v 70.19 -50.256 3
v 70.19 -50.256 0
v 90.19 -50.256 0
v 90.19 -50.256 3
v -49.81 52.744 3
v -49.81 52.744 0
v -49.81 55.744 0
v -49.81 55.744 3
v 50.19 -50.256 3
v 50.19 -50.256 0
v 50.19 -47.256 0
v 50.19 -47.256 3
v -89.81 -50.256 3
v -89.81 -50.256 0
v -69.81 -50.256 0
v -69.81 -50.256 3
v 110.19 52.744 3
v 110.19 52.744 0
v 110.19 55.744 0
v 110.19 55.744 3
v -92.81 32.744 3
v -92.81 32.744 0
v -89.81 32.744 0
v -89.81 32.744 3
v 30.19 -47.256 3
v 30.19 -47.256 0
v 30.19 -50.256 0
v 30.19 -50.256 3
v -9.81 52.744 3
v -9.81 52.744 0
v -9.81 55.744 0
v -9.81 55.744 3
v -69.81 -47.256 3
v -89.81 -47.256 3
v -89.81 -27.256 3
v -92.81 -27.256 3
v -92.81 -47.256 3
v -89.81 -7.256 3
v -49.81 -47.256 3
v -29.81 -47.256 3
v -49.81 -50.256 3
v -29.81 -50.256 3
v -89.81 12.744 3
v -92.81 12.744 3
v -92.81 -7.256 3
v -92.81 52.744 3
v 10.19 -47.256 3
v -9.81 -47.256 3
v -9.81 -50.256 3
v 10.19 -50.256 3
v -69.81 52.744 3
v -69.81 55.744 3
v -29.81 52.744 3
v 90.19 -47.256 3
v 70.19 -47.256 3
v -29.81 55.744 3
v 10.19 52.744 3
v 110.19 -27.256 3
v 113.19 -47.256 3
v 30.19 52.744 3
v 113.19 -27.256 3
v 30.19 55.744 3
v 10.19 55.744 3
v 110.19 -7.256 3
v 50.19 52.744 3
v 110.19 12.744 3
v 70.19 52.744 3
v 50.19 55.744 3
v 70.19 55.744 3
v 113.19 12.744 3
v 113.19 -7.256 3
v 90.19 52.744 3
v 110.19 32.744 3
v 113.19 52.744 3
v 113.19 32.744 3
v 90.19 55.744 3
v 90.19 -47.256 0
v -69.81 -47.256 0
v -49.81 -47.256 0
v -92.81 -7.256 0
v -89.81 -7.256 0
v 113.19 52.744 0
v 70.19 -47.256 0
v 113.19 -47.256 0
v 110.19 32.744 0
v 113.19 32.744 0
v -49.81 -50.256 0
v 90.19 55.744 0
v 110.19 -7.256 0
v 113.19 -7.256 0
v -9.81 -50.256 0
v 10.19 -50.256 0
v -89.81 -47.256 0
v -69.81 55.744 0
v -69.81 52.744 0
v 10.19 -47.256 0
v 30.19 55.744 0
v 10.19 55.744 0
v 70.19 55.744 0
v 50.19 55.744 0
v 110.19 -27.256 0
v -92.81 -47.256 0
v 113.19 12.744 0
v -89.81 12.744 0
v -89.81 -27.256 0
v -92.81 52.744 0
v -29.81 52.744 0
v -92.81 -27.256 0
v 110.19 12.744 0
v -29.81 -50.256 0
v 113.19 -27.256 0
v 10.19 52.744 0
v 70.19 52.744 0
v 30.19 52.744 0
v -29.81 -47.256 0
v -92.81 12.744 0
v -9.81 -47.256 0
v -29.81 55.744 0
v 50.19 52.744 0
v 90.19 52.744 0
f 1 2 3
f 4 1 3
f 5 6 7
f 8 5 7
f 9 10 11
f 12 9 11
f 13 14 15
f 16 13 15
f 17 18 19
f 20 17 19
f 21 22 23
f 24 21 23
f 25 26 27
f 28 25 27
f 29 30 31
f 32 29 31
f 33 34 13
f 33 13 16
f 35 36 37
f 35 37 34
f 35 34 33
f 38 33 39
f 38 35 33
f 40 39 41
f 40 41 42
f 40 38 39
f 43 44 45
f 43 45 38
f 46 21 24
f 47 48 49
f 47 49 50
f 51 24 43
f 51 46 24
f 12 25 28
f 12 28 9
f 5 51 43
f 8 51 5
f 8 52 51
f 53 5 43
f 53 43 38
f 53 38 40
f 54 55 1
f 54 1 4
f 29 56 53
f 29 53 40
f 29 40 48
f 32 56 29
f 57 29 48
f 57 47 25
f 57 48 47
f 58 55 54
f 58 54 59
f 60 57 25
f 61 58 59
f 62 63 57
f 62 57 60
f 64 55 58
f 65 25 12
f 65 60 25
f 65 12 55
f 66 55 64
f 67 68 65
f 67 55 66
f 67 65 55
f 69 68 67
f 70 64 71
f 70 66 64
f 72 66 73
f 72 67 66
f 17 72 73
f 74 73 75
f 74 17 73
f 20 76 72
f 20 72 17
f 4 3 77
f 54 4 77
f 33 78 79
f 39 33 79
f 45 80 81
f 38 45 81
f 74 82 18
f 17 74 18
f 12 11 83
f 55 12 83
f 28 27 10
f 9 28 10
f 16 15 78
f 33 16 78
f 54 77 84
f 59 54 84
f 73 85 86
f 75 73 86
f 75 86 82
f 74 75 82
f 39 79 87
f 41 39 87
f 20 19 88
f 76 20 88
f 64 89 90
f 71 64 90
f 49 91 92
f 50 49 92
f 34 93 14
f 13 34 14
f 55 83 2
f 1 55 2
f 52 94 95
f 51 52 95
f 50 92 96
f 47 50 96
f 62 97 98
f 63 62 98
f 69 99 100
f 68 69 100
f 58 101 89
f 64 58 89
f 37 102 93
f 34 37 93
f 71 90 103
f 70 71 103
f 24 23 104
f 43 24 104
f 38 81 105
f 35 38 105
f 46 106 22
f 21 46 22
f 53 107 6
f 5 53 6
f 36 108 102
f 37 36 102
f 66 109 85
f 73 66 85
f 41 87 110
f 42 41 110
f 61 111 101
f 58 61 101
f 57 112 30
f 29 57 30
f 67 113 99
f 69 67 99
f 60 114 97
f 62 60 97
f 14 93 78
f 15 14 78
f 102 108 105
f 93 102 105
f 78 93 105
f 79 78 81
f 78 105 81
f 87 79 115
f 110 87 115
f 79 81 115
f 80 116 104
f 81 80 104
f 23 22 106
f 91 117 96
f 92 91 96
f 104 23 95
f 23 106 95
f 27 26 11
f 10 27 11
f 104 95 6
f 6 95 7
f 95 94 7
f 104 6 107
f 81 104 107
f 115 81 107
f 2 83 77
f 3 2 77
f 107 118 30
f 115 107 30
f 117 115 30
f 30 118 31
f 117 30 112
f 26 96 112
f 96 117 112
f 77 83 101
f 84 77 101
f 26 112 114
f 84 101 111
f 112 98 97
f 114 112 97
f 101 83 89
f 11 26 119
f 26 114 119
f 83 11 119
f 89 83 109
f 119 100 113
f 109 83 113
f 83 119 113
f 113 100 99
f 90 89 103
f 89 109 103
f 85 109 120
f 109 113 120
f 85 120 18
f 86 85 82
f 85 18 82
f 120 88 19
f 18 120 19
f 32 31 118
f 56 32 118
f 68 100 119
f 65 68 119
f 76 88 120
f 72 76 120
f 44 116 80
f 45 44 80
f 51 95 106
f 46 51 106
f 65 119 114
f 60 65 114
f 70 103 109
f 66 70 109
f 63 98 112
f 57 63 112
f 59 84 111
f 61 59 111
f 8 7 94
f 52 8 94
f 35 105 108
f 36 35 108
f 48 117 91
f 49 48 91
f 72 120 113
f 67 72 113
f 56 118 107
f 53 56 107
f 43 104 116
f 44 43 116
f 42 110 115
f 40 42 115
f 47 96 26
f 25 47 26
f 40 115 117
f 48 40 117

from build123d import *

# Parameters (mm, degrees)
BOSS_EXTRUDE1_DEPTH = 3


with BuildPart() as part:
    # Sketch1 → Boss-Extrude1 (new body)
    with BuildSketch(Plane.XY):
        Polygon((70.190369541, 52.74356103), (70.190369541, 55.74356103), (50.190369541, 55.74356103), (50.190369541, 52.74356103), (30.190369541, 52.74356103), (30.190369541, 55.74356103), (10.190369541, 55.74356103), (10.190369541, 52.74356103), (-9.809630459, 52.74356103), (-9.809630459, 55.74356103), (-29.809630459, 55.74356103), (-29.809630459, 52.74356103), (-49.809630459, 52.74356103), (-49.809630459, 55.74356103), (-69.809630459, 55.74356103), (-69.809630459, 52.74356103), (-89.809630459, 52.74356103), (-92.809630459, 52.74356103), (-92.809630459, 32.74356103), (-89.809630459, 32.74356103), (-89.809630459, 12.74356103), (-92.809630459, 12.74356103), (-92.809630459, -7.25643897), (-89.809630459, -7.25643897), (-89.809630459, -27.25643897), (-92.809630459, -27.25643897), (-92.809630459, -47.25643897), (-89.809630459, -47.25643897), (-89.809630459, -50.25643897), (-69.809630459, -50.25643897), (-69.809630459, -47.25643897), (-49.809630459, -47.25643897), (-49.809630459, -50.25643897), (-29.809630459, -50.25643897), (-29.809630459, -47.25643897), (-9.809630459, -47.25643897), (-9.809630459, -50.25643897), (10.190369541, -50.25643897), (10.190369541, -47.25643897), (30.190369541, -47.25643897), (30.190369541, -50.25643897), (50.190369541, -50.25643897), (50.190369541, -47.25643897), (70.190369541, -47.25643897), (70.190369541, -50.25643897), (90.190369541, -50.25643897), (90.190369541, -47.25643897), (110.190369541, -47.25643897), (113.190369541, -47.25643897), (113.190369541, -27.25643897), (110.190369541, -27.25643897), (110.190369541, -7.25643897), (113.190369541, -7.25643897), (113.190369541, 12.74356103), (110.190369541, 12.74356103), (110.190369541, 32.74356103), (113.190369541, 32.74356103), (113.190369541, 52.74356103), (110.190369541, 52.74356103), (110.190369541, 55.74356103), (90.190369541, 55.74356103), (90.190369541, 52.74356103), align=None)
    extrude(amount=BOSS_EXTRUDE1_DEPTH)


solid = part.part
